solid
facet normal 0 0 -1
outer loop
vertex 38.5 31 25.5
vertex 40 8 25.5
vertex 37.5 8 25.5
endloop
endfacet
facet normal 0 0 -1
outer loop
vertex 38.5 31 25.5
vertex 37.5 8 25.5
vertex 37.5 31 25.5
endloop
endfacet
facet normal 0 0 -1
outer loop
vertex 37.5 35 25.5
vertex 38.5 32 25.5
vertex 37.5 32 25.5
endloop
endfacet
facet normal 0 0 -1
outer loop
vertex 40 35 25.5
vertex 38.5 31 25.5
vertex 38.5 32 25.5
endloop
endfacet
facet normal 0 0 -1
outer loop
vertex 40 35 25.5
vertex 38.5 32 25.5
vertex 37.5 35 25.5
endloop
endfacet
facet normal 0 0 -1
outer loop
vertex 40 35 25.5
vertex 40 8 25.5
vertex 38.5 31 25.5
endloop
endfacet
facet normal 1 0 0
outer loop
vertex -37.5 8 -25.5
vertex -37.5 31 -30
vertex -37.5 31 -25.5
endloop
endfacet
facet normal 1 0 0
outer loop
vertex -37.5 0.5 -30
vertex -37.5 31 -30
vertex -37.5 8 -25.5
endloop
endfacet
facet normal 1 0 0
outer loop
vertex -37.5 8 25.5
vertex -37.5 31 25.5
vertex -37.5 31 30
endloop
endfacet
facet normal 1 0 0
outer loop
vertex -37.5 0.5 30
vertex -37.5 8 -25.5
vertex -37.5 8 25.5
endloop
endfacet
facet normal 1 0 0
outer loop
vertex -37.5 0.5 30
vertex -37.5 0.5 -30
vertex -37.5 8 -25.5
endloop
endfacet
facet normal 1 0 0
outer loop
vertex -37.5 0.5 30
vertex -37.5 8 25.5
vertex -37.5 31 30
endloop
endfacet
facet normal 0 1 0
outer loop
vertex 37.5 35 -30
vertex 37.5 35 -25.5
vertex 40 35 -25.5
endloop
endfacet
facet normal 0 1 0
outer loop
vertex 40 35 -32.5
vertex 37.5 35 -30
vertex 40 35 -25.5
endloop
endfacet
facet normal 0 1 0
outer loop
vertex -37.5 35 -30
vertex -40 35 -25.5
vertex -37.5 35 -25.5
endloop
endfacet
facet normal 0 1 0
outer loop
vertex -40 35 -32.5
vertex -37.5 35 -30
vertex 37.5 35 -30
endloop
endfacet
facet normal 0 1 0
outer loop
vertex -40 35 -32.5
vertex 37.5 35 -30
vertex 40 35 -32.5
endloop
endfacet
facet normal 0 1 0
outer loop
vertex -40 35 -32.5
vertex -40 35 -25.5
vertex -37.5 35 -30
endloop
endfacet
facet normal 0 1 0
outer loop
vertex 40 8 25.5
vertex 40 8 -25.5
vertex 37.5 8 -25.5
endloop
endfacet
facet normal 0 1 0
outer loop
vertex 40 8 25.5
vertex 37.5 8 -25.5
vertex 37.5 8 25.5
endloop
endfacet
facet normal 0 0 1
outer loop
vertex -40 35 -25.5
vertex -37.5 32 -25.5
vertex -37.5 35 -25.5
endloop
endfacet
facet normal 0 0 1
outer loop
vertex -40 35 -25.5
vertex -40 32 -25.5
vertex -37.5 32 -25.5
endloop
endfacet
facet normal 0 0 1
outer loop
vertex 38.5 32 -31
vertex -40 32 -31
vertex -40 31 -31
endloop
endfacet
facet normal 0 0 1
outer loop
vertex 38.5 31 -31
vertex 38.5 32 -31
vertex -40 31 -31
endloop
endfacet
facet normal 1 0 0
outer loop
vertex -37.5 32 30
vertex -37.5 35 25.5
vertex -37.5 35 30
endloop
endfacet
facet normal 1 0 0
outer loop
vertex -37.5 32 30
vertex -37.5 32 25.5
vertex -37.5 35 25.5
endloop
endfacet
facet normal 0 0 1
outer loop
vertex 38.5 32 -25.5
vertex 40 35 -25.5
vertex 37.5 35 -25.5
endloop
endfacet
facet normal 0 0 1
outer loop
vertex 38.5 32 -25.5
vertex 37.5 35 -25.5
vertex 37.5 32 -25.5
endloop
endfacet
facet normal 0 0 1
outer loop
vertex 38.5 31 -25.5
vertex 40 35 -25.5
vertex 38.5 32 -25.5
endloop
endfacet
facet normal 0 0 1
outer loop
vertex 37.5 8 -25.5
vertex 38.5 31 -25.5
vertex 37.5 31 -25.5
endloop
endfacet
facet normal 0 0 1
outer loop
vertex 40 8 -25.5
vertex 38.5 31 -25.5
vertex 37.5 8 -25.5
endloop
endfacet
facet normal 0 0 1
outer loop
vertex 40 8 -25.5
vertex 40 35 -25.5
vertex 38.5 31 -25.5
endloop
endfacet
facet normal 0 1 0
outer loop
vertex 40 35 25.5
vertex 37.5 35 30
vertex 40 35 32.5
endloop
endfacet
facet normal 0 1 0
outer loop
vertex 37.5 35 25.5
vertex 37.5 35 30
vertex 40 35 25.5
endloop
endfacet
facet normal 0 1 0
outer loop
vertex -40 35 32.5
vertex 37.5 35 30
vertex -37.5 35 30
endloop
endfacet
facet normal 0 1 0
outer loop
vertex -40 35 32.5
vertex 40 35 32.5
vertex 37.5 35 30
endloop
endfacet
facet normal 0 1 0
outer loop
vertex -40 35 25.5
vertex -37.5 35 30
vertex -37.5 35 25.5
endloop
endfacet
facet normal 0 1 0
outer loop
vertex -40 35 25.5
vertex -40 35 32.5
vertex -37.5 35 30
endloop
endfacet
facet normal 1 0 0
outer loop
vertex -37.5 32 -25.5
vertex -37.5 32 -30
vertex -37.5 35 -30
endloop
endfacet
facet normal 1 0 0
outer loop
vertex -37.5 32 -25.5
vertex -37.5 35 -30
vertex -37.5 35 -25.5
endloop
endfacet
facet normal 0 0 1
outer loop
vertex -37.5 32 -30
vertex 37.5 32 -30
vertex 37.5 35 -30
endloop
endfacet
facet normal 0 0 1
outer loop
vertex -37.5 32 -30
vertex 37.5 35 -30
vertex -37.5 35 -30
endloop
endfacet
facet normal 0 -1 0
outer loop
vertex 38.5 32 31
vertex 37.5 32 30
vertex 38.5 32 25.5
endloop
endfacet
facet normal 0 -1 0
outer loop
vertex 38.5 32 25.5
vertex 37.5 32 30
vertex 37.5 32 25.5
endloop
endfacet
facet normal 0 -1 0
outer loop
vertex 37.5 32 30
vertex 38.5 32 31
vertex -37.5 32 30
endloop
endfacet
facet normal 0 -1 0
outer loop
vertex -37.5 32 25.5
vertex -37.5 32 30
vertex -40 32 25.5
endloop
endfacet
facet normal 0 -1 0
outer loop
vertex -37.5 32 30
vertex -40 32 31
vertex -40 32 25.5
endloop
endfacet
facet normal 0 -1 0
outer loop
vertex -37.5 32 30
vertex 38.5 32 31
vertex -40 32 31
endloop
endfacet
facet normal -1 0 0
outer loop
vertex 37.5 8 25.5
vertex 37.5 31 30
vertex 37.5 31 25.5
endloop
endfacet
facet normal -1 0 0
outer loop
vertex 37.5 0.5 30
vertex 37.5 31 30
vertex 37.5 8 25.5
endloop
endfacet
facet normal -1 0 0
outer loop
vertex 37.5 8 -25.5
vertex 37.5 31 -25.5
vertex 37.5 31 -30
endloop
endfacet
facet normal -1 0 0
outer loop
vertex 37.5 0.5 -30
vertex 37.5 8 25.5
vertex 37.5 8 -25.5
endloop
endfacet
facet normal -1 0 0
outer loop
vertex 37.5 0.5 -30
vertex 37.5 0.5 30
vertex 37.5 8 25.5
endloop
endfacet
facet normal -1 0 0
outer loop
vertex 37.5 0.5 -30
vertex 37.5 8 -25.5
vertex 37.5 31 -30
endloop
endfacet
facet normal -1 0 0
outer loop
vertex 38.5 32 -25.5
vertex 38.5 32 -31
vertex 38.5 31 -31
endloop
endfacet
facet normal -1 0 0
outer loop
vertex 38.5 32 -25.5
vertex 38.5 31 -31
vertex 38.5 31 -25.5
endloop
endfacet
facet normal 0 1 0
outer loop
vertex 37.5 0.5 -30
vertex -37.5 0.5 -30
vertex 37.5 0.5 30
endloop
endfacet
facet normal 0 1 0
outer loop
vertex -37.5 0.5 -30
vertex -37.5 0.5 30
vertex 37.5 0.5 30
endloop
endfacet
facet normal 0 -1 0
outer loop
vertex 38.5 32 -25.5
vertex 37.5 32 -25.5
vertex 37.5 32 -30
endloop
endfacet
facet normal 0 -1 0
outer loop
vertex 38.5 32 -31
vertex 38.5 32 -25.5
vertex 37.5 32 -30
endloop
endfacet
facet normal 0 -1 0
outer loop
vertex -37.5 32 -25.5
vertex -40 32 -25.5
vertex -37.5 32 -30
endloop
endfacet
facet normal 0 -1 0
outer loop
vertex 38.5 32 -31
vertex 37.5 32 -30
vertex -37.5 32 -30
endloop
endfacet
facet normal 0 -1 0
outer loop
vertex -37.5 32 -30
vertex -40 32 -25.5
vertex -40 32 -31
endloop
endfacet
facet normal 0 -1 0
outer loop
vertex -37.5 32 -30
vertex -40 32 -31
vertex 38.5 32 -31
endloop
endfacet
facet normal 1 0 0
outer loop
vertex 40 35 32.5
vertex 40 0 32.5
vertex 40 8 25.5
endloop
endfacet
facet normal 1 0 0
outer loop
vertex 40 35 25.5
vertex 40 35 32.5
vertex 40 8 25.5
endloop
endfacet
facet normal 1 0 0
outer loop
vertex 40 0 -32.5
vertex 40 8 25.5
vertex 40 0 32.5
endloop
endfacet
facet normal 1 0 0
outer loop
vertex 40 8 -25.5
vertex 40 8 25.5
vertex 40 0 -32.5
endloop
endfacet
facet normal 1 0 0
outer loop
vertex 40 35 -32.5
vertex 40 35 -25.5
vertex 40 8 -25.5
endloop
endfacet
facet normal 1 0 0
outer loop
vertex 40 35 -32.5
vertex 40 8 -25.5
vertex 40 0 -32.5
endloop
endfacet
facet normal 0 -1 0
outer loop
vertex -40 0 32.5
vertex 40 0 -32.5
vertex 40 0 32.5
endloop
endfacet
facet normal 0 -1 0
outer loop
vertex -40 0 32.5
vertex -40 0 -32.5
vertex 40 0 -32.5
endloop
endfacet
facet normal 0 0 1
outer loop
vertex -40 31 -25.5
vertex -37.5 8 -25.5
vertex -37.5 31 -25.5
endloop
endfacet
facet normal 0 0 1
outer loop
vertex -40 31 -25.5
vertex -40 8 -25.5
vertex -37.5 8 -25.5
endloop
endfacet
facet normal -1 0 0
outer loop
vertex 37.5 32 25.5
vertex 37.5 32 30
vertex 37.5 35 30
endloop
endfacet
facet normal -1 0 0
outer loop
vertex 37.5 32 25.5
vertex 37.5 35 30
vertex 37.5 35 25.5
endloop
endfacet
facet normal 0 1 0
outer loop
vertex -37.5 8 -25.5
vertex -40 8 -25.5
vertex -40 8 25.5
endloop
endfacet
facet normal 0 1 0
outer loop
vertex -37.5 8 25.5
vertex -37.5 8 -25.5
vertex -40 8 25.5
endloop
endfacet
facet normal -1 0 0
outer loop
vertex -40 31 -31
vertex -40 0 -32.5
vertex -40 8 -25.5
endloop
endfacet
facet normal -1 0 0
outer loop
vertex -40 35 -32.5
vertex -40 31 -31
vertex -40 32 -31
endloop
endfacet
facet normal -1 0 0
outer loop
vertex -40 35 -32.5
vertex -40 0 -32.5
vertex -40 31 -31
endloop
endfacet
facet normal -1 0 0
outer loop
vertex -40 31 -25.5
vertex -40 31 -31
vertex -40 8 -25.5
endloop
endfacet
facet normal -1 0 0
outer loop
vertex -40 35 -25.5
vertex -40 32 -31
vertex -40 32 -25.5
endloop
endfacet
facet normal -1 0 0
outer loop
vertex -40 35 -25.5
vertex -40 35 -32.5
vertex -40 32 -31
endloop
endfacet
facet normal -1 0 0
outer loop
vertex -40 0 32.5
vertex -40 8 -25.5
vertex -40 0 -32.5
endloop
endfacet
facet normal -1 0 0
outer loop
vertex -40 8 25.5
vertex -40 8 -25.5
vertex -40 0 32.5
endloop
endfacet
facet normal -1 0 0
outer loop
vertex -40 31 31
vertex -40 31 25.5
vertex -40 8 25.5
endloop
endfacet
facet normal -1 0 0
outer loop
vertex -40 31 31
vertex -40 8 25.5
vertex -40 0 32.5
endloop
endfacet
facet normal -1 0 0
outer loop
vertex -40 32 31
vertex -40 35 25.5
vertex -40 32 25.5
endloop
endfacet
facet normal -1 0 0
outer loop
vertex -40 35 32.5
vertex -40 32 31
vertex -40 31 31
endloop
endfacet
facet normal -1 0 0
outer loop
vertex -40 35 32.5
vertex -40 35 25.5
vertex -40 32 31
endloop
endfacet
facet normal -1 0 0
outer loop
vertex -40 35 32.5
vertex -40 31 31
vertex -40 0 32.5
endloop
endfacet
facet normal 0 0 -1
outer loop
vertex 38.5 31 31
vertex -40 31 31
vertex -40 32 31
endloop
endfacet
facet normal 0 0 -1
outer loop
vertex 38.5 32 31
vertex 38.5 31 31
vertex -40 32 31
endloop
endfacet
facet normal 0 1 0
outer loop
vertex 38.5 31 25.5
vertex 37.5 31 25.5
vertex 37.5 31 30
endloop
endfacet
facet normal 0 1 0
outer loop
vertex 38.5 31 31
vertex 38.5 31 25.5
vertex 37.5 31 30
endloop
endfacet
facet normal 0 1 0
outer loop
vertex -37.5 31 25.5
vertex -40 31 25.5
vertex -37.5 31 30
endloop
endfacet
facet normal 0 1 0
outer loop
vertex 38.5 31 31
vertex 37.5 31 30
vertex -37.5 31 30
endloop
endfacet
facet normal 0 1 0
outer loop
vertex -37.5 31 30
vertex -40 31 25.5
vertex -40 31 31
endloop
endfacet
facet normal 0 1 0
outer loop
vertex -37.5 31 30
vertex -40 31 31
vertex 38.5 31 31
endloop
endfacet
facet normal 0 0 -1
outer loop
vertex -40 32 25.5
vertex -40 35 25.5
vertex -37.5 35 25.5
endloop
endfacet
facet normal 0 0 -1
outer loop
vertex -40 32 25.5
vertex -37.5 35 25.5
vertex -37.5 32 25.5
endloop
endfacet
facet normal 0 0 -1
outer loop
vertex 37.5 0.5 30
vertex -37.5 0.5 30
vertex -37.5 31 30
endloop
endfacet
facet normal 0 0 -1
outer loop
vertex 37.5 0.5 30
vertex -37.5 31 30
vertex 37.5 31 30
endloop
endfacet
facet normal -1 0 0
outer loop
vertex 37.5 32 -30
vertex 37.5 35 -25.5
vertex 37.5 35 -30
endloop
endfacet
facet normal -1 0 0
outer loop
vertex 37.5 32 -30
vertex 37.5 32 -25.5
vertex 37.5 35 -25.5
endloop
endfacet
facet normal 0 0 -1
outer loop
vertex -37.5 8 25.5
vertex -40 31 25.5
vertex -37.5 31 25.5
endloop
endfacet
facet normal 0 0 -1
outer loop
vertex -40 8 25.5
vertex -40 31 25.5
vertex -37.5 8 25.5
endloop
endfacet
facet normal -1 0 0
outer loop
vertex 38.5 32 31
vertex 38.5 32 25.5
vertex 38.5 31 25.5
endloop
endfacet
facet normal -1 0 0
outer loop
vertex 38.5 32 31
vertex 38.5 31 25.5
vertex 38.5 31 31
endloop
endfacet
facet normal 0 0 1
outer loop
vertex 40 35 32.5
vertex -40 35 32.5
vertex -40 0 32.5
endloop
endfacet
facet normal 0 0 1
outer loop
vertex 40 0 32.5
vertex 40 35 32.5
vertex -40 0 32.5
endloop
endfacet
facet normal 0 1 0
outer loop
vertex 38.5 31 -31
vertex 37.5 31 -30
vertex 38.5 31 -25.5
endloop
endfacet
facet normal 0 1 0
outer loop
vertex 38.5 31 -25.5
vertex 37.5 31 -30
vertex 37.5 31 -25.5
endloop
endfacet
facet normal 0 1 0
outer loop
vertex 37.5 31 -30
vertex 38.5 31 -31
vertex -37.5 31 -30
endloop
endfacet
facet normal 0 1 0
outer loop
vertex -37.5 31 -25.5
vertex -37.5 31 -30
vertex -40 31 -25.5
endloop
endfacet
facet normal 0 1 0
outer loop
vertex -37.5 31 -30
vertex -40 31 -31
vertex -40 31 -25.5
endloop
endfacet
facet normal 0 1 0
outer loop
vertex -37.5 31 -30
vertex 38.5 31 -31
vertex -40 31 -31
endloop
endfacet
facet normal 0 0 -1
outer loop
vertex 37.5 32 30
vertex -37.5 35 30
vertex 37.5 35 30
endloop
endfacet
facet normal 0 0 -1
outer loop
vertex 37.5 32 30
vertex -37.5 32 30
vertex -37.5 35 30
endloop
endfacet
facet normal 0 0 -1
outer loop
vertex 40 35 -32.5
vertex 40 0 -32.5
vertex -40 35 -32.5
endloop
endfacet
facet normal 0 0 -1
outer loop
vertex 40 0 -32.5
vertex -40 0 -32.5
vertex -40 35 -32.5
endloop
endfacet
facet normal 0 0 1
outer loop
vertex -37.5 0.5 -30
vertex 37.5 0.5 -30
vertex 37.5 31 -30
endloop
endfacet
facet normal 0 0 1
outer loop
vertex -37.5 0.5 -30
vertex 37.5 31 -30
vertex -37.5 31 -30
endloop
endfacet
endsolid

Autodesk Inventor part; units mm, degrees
ref_plane "YZ Plane" through (0, 0, 0) normal (1, 0, 0) x (0, 1, 0)
ref_plane "XZ Plane" through (0, 0, 0) normal (0, 1, 0) x (-1, 0, 0)
sketch "Sketch1" plane through (0, 0, 0) normal (0, 1, 0) x (-1, 0, 0)
  line L0 (37.5, 30) -> (-37.5, 30)
  line L1 (-37.5, 30) -> (-37.5, -30)
  line L2 (-37.5, -30) -> (37.5, -30)
  line L3 (37.5, -30) -> (37.5, 30)
  line L4 (37.5, 30) -> (-37.5, -30) construction
  line L5 (-37.5, 30) -> (37.5, -30) construction
  line L6 (38, 30.5) -> (-38, 30.5)
  line L7 (-38, 30.5) -> (-38, -30.5)
  line L8 (-38, -30.5) -> (38, -30.5)
  line L9 (38, -30.5) -> (38, 30.5)
  line L10 (38, 30.5) -> (-38, -30.5) construction
  line L11 (-38, 30.5) -> (38, -30.5) construction
  point P0 (0, 0)
  dimension "d0" = 75
  dimension "d1" = 60
  dimension "d2" = 76
  dimension "d3" = 61
extrude "Extrusion1" add sketch "Sketch1" along normal blind 35
sketch "Sketch2" plane through (0, 0, 0) normal (0, -1, 0) x (1, 0, 0)
  line L0 (37.5, -30) -> (37.5, 30) projected
  line L1 (-37.5, 30) -> (37.5, 30)
  line L2 (37.5, 30) -> (37.5, -30)
  line L3 (37.5, -30) -> (-37.5, -30)
  line L4 (-37.5, -30) -> (-37.5, 30)
  line L5 (-37.5, 30) -> (37.5, -30) construction
  line L6 (37.5, 30) -> (-37.5, -30) construction
  point P0 (0, 0)
extrude "Extrusion2" add sketch "Sketch2" against normal blind 0.5
sketch "Sketch4" plane through (-38, 0, -30.5) normal (-1, 0, 0) x (0, 0, 1)
  line L0 (61, 35) -> (0, 35) projected
  line L1 (0, 35) -> (5, 35)
  line L2 (61, 35) -> (56, 35)
  line L3 (30.5, 0) -> (30.5, 8)
  line L4 (5, 35) -> (56, 35)
  line L5 (56, 35) -> (56, 13)
  line L6 (56, 13) -> (5, 13)
  line L7 (5, 13) -> (5, 35)
  line L8 (5, 35) -> (56, 35)
  line L9 (56, 35) -> (56, 8)
  line L10 (56, 8) -> (5, 8)
  line L11 (5, 8) -> (5, 35)
  point P0 (5, 13)
  dimension "d8" = 5
  dimension "d9" = 5
  dimension "d10" = 8
extrude "Extrusion3" cut sketch "Sketch4" against normal blind 30
sketch "Sketch6" plane through (38, 0, -30.5) normal (0, 0, -1) x (-1, 0, 0)
  line L0 (0, 0) -> (0, 35) projected
  line L1 (0, 0) -> (76, 0) projected
  line L2 (0, 35) -> (76, 35)
  line L3 (76, 35) -> (76, 0)
  line L4 (76, 0) -> (0, 0)
  line L5 (0, 0) -> (0, 35)
  point P0 (38, 0)
extrude "Extrusion4" add sketch "Sketch6" along normal blind 2
sketch "Sketch7" plane through (-38, 0, 30.5) normal (0, 0, 1) x (1, 0, 0)
  line L0 (76, 0) -> (76, 35) projected
  line L1 (0, 0) -> (0, 35) projected
  line L2 (76, 35) -> (0, 35)
  line L3 (0, 35) -> (0, 0)
  line L4 (0, 0) -> (76, 0)
  line L5 (76, 0) -> (76, 35)
  point P0 (38, 0)
  point P1 (0, 35)
extrude "Extrusion5" add sketch "Sketch7" along normal blind 2
sketch "Sketch8" plane through (-38, 13, -25.5) normal (-1, 0, 0) x (0, 0, 1)
  line L0 (0, 22) -> (-7, 22) projected
  line L1 (58, -13) -> (-7, -13) projected
  line L2 (-7, 22) -> (58, 22)
  line L3 (58, 22) -> (58, -13)
  line L4 (58, -13) -> (-7, -13)
  line L5 (-7, -13) -> (-7, 22)
  point P0 (25.5, -13)
  point P1 (0, 22)
  point P2 (-7, -13)
extrude "Extrusion6" add sketch "Sketch8" along normal blind 2
sketch "Sketch10" plane through (38, 0, -32.5) normal (1, 0, 0) x (0, 0, -1)
  line L0 (-65, 35) -> (0, 35) projected
  line L1 (0, 0) -> (-65, 0) projected
  line L2 (0, 35) -> (-65, 35)
  line L3 (-65, 35) -> (-65, 0)
  line L4 (-65, 0) -> (0, 0)
  line L5 (0, 0) -> (0, 35)
  point P0 (-32.5, 0)
  point P1 (-7, 35)
  point P2 (-7, 35)
extrude "Extrusion8" add sketch "Sketch10" along normal blind 2
sketch "Sketch12" plane through (-40, 13, -25.5) normal (-1, 0, 0) x (0, 0, 1)
  line L0 (0, 22) -> (0, -5) projected
  line L1 (0, -5) -> (51, -5) projected
  line L2 (0, 22) -> (51, 22)
  line L3 (51, 22) -> (51, -5)
  line L4 (51, -5) -> (0, -5)
  line L5 (0, -5) -> (0, 22)
  point P0 (25.5, -13)
extrude "Extrusion9" cut sketch "Sketch12" against normal blind 30
ref_plane "Work Plane2" through (0, 13, -25.5) normal (-1, 0, 0) x (0, 0, 1)
mirror "Mirror3" about plane through (0, 13, -25.5) normal (-1, 0, 0) of "Extrusion3", "Extrusion9"
sketch "Sketch13" plane through (-40, 13, -25.5) normal (-1, 0, 0) x (0, 0, 1)
  line L0 (0, 22) -> (0, -5) projected
  line L1 (0, 22) -> (0, 18)
  line L2 (51, -5) -> (51, 22) projected
  line L3 (51, 22) -> (51, 18)
  line L4 (-7, 22) -> (-7, -13) projected
  line L5 (-7, 18) -> (-5.5, 18)
  line L6 (-7, 18) -> (-5.5, 18) construction
  line L7 (51, 22) -> (51, 18)
  line L8 (58, -13) -> (58, 22) projected
  line L9 (58, 18) -> (56.5, 18)
  line L10 (-5.5, 18) -> (56.5, 18)
  line L11 (56.5, 18) -> (56.5, 19)
  line L12 (56.5, 19) -> (-5.5, 19)
  line L13 (-5.5, 19) -> (-5.5, 18)
  point P0 (25.5, -13)
  dimension "d25" = 4
  dimension "d26" = 1.5
  dimension "d27" = 0
  dimension "d28" = 4
  dimension "d29" = 1.5
  dimension "d30" = 1
extrude "Extrusion10" cut sketch "Sketch13" against normal blind 78.5
properties part number "3 Pzem test"
